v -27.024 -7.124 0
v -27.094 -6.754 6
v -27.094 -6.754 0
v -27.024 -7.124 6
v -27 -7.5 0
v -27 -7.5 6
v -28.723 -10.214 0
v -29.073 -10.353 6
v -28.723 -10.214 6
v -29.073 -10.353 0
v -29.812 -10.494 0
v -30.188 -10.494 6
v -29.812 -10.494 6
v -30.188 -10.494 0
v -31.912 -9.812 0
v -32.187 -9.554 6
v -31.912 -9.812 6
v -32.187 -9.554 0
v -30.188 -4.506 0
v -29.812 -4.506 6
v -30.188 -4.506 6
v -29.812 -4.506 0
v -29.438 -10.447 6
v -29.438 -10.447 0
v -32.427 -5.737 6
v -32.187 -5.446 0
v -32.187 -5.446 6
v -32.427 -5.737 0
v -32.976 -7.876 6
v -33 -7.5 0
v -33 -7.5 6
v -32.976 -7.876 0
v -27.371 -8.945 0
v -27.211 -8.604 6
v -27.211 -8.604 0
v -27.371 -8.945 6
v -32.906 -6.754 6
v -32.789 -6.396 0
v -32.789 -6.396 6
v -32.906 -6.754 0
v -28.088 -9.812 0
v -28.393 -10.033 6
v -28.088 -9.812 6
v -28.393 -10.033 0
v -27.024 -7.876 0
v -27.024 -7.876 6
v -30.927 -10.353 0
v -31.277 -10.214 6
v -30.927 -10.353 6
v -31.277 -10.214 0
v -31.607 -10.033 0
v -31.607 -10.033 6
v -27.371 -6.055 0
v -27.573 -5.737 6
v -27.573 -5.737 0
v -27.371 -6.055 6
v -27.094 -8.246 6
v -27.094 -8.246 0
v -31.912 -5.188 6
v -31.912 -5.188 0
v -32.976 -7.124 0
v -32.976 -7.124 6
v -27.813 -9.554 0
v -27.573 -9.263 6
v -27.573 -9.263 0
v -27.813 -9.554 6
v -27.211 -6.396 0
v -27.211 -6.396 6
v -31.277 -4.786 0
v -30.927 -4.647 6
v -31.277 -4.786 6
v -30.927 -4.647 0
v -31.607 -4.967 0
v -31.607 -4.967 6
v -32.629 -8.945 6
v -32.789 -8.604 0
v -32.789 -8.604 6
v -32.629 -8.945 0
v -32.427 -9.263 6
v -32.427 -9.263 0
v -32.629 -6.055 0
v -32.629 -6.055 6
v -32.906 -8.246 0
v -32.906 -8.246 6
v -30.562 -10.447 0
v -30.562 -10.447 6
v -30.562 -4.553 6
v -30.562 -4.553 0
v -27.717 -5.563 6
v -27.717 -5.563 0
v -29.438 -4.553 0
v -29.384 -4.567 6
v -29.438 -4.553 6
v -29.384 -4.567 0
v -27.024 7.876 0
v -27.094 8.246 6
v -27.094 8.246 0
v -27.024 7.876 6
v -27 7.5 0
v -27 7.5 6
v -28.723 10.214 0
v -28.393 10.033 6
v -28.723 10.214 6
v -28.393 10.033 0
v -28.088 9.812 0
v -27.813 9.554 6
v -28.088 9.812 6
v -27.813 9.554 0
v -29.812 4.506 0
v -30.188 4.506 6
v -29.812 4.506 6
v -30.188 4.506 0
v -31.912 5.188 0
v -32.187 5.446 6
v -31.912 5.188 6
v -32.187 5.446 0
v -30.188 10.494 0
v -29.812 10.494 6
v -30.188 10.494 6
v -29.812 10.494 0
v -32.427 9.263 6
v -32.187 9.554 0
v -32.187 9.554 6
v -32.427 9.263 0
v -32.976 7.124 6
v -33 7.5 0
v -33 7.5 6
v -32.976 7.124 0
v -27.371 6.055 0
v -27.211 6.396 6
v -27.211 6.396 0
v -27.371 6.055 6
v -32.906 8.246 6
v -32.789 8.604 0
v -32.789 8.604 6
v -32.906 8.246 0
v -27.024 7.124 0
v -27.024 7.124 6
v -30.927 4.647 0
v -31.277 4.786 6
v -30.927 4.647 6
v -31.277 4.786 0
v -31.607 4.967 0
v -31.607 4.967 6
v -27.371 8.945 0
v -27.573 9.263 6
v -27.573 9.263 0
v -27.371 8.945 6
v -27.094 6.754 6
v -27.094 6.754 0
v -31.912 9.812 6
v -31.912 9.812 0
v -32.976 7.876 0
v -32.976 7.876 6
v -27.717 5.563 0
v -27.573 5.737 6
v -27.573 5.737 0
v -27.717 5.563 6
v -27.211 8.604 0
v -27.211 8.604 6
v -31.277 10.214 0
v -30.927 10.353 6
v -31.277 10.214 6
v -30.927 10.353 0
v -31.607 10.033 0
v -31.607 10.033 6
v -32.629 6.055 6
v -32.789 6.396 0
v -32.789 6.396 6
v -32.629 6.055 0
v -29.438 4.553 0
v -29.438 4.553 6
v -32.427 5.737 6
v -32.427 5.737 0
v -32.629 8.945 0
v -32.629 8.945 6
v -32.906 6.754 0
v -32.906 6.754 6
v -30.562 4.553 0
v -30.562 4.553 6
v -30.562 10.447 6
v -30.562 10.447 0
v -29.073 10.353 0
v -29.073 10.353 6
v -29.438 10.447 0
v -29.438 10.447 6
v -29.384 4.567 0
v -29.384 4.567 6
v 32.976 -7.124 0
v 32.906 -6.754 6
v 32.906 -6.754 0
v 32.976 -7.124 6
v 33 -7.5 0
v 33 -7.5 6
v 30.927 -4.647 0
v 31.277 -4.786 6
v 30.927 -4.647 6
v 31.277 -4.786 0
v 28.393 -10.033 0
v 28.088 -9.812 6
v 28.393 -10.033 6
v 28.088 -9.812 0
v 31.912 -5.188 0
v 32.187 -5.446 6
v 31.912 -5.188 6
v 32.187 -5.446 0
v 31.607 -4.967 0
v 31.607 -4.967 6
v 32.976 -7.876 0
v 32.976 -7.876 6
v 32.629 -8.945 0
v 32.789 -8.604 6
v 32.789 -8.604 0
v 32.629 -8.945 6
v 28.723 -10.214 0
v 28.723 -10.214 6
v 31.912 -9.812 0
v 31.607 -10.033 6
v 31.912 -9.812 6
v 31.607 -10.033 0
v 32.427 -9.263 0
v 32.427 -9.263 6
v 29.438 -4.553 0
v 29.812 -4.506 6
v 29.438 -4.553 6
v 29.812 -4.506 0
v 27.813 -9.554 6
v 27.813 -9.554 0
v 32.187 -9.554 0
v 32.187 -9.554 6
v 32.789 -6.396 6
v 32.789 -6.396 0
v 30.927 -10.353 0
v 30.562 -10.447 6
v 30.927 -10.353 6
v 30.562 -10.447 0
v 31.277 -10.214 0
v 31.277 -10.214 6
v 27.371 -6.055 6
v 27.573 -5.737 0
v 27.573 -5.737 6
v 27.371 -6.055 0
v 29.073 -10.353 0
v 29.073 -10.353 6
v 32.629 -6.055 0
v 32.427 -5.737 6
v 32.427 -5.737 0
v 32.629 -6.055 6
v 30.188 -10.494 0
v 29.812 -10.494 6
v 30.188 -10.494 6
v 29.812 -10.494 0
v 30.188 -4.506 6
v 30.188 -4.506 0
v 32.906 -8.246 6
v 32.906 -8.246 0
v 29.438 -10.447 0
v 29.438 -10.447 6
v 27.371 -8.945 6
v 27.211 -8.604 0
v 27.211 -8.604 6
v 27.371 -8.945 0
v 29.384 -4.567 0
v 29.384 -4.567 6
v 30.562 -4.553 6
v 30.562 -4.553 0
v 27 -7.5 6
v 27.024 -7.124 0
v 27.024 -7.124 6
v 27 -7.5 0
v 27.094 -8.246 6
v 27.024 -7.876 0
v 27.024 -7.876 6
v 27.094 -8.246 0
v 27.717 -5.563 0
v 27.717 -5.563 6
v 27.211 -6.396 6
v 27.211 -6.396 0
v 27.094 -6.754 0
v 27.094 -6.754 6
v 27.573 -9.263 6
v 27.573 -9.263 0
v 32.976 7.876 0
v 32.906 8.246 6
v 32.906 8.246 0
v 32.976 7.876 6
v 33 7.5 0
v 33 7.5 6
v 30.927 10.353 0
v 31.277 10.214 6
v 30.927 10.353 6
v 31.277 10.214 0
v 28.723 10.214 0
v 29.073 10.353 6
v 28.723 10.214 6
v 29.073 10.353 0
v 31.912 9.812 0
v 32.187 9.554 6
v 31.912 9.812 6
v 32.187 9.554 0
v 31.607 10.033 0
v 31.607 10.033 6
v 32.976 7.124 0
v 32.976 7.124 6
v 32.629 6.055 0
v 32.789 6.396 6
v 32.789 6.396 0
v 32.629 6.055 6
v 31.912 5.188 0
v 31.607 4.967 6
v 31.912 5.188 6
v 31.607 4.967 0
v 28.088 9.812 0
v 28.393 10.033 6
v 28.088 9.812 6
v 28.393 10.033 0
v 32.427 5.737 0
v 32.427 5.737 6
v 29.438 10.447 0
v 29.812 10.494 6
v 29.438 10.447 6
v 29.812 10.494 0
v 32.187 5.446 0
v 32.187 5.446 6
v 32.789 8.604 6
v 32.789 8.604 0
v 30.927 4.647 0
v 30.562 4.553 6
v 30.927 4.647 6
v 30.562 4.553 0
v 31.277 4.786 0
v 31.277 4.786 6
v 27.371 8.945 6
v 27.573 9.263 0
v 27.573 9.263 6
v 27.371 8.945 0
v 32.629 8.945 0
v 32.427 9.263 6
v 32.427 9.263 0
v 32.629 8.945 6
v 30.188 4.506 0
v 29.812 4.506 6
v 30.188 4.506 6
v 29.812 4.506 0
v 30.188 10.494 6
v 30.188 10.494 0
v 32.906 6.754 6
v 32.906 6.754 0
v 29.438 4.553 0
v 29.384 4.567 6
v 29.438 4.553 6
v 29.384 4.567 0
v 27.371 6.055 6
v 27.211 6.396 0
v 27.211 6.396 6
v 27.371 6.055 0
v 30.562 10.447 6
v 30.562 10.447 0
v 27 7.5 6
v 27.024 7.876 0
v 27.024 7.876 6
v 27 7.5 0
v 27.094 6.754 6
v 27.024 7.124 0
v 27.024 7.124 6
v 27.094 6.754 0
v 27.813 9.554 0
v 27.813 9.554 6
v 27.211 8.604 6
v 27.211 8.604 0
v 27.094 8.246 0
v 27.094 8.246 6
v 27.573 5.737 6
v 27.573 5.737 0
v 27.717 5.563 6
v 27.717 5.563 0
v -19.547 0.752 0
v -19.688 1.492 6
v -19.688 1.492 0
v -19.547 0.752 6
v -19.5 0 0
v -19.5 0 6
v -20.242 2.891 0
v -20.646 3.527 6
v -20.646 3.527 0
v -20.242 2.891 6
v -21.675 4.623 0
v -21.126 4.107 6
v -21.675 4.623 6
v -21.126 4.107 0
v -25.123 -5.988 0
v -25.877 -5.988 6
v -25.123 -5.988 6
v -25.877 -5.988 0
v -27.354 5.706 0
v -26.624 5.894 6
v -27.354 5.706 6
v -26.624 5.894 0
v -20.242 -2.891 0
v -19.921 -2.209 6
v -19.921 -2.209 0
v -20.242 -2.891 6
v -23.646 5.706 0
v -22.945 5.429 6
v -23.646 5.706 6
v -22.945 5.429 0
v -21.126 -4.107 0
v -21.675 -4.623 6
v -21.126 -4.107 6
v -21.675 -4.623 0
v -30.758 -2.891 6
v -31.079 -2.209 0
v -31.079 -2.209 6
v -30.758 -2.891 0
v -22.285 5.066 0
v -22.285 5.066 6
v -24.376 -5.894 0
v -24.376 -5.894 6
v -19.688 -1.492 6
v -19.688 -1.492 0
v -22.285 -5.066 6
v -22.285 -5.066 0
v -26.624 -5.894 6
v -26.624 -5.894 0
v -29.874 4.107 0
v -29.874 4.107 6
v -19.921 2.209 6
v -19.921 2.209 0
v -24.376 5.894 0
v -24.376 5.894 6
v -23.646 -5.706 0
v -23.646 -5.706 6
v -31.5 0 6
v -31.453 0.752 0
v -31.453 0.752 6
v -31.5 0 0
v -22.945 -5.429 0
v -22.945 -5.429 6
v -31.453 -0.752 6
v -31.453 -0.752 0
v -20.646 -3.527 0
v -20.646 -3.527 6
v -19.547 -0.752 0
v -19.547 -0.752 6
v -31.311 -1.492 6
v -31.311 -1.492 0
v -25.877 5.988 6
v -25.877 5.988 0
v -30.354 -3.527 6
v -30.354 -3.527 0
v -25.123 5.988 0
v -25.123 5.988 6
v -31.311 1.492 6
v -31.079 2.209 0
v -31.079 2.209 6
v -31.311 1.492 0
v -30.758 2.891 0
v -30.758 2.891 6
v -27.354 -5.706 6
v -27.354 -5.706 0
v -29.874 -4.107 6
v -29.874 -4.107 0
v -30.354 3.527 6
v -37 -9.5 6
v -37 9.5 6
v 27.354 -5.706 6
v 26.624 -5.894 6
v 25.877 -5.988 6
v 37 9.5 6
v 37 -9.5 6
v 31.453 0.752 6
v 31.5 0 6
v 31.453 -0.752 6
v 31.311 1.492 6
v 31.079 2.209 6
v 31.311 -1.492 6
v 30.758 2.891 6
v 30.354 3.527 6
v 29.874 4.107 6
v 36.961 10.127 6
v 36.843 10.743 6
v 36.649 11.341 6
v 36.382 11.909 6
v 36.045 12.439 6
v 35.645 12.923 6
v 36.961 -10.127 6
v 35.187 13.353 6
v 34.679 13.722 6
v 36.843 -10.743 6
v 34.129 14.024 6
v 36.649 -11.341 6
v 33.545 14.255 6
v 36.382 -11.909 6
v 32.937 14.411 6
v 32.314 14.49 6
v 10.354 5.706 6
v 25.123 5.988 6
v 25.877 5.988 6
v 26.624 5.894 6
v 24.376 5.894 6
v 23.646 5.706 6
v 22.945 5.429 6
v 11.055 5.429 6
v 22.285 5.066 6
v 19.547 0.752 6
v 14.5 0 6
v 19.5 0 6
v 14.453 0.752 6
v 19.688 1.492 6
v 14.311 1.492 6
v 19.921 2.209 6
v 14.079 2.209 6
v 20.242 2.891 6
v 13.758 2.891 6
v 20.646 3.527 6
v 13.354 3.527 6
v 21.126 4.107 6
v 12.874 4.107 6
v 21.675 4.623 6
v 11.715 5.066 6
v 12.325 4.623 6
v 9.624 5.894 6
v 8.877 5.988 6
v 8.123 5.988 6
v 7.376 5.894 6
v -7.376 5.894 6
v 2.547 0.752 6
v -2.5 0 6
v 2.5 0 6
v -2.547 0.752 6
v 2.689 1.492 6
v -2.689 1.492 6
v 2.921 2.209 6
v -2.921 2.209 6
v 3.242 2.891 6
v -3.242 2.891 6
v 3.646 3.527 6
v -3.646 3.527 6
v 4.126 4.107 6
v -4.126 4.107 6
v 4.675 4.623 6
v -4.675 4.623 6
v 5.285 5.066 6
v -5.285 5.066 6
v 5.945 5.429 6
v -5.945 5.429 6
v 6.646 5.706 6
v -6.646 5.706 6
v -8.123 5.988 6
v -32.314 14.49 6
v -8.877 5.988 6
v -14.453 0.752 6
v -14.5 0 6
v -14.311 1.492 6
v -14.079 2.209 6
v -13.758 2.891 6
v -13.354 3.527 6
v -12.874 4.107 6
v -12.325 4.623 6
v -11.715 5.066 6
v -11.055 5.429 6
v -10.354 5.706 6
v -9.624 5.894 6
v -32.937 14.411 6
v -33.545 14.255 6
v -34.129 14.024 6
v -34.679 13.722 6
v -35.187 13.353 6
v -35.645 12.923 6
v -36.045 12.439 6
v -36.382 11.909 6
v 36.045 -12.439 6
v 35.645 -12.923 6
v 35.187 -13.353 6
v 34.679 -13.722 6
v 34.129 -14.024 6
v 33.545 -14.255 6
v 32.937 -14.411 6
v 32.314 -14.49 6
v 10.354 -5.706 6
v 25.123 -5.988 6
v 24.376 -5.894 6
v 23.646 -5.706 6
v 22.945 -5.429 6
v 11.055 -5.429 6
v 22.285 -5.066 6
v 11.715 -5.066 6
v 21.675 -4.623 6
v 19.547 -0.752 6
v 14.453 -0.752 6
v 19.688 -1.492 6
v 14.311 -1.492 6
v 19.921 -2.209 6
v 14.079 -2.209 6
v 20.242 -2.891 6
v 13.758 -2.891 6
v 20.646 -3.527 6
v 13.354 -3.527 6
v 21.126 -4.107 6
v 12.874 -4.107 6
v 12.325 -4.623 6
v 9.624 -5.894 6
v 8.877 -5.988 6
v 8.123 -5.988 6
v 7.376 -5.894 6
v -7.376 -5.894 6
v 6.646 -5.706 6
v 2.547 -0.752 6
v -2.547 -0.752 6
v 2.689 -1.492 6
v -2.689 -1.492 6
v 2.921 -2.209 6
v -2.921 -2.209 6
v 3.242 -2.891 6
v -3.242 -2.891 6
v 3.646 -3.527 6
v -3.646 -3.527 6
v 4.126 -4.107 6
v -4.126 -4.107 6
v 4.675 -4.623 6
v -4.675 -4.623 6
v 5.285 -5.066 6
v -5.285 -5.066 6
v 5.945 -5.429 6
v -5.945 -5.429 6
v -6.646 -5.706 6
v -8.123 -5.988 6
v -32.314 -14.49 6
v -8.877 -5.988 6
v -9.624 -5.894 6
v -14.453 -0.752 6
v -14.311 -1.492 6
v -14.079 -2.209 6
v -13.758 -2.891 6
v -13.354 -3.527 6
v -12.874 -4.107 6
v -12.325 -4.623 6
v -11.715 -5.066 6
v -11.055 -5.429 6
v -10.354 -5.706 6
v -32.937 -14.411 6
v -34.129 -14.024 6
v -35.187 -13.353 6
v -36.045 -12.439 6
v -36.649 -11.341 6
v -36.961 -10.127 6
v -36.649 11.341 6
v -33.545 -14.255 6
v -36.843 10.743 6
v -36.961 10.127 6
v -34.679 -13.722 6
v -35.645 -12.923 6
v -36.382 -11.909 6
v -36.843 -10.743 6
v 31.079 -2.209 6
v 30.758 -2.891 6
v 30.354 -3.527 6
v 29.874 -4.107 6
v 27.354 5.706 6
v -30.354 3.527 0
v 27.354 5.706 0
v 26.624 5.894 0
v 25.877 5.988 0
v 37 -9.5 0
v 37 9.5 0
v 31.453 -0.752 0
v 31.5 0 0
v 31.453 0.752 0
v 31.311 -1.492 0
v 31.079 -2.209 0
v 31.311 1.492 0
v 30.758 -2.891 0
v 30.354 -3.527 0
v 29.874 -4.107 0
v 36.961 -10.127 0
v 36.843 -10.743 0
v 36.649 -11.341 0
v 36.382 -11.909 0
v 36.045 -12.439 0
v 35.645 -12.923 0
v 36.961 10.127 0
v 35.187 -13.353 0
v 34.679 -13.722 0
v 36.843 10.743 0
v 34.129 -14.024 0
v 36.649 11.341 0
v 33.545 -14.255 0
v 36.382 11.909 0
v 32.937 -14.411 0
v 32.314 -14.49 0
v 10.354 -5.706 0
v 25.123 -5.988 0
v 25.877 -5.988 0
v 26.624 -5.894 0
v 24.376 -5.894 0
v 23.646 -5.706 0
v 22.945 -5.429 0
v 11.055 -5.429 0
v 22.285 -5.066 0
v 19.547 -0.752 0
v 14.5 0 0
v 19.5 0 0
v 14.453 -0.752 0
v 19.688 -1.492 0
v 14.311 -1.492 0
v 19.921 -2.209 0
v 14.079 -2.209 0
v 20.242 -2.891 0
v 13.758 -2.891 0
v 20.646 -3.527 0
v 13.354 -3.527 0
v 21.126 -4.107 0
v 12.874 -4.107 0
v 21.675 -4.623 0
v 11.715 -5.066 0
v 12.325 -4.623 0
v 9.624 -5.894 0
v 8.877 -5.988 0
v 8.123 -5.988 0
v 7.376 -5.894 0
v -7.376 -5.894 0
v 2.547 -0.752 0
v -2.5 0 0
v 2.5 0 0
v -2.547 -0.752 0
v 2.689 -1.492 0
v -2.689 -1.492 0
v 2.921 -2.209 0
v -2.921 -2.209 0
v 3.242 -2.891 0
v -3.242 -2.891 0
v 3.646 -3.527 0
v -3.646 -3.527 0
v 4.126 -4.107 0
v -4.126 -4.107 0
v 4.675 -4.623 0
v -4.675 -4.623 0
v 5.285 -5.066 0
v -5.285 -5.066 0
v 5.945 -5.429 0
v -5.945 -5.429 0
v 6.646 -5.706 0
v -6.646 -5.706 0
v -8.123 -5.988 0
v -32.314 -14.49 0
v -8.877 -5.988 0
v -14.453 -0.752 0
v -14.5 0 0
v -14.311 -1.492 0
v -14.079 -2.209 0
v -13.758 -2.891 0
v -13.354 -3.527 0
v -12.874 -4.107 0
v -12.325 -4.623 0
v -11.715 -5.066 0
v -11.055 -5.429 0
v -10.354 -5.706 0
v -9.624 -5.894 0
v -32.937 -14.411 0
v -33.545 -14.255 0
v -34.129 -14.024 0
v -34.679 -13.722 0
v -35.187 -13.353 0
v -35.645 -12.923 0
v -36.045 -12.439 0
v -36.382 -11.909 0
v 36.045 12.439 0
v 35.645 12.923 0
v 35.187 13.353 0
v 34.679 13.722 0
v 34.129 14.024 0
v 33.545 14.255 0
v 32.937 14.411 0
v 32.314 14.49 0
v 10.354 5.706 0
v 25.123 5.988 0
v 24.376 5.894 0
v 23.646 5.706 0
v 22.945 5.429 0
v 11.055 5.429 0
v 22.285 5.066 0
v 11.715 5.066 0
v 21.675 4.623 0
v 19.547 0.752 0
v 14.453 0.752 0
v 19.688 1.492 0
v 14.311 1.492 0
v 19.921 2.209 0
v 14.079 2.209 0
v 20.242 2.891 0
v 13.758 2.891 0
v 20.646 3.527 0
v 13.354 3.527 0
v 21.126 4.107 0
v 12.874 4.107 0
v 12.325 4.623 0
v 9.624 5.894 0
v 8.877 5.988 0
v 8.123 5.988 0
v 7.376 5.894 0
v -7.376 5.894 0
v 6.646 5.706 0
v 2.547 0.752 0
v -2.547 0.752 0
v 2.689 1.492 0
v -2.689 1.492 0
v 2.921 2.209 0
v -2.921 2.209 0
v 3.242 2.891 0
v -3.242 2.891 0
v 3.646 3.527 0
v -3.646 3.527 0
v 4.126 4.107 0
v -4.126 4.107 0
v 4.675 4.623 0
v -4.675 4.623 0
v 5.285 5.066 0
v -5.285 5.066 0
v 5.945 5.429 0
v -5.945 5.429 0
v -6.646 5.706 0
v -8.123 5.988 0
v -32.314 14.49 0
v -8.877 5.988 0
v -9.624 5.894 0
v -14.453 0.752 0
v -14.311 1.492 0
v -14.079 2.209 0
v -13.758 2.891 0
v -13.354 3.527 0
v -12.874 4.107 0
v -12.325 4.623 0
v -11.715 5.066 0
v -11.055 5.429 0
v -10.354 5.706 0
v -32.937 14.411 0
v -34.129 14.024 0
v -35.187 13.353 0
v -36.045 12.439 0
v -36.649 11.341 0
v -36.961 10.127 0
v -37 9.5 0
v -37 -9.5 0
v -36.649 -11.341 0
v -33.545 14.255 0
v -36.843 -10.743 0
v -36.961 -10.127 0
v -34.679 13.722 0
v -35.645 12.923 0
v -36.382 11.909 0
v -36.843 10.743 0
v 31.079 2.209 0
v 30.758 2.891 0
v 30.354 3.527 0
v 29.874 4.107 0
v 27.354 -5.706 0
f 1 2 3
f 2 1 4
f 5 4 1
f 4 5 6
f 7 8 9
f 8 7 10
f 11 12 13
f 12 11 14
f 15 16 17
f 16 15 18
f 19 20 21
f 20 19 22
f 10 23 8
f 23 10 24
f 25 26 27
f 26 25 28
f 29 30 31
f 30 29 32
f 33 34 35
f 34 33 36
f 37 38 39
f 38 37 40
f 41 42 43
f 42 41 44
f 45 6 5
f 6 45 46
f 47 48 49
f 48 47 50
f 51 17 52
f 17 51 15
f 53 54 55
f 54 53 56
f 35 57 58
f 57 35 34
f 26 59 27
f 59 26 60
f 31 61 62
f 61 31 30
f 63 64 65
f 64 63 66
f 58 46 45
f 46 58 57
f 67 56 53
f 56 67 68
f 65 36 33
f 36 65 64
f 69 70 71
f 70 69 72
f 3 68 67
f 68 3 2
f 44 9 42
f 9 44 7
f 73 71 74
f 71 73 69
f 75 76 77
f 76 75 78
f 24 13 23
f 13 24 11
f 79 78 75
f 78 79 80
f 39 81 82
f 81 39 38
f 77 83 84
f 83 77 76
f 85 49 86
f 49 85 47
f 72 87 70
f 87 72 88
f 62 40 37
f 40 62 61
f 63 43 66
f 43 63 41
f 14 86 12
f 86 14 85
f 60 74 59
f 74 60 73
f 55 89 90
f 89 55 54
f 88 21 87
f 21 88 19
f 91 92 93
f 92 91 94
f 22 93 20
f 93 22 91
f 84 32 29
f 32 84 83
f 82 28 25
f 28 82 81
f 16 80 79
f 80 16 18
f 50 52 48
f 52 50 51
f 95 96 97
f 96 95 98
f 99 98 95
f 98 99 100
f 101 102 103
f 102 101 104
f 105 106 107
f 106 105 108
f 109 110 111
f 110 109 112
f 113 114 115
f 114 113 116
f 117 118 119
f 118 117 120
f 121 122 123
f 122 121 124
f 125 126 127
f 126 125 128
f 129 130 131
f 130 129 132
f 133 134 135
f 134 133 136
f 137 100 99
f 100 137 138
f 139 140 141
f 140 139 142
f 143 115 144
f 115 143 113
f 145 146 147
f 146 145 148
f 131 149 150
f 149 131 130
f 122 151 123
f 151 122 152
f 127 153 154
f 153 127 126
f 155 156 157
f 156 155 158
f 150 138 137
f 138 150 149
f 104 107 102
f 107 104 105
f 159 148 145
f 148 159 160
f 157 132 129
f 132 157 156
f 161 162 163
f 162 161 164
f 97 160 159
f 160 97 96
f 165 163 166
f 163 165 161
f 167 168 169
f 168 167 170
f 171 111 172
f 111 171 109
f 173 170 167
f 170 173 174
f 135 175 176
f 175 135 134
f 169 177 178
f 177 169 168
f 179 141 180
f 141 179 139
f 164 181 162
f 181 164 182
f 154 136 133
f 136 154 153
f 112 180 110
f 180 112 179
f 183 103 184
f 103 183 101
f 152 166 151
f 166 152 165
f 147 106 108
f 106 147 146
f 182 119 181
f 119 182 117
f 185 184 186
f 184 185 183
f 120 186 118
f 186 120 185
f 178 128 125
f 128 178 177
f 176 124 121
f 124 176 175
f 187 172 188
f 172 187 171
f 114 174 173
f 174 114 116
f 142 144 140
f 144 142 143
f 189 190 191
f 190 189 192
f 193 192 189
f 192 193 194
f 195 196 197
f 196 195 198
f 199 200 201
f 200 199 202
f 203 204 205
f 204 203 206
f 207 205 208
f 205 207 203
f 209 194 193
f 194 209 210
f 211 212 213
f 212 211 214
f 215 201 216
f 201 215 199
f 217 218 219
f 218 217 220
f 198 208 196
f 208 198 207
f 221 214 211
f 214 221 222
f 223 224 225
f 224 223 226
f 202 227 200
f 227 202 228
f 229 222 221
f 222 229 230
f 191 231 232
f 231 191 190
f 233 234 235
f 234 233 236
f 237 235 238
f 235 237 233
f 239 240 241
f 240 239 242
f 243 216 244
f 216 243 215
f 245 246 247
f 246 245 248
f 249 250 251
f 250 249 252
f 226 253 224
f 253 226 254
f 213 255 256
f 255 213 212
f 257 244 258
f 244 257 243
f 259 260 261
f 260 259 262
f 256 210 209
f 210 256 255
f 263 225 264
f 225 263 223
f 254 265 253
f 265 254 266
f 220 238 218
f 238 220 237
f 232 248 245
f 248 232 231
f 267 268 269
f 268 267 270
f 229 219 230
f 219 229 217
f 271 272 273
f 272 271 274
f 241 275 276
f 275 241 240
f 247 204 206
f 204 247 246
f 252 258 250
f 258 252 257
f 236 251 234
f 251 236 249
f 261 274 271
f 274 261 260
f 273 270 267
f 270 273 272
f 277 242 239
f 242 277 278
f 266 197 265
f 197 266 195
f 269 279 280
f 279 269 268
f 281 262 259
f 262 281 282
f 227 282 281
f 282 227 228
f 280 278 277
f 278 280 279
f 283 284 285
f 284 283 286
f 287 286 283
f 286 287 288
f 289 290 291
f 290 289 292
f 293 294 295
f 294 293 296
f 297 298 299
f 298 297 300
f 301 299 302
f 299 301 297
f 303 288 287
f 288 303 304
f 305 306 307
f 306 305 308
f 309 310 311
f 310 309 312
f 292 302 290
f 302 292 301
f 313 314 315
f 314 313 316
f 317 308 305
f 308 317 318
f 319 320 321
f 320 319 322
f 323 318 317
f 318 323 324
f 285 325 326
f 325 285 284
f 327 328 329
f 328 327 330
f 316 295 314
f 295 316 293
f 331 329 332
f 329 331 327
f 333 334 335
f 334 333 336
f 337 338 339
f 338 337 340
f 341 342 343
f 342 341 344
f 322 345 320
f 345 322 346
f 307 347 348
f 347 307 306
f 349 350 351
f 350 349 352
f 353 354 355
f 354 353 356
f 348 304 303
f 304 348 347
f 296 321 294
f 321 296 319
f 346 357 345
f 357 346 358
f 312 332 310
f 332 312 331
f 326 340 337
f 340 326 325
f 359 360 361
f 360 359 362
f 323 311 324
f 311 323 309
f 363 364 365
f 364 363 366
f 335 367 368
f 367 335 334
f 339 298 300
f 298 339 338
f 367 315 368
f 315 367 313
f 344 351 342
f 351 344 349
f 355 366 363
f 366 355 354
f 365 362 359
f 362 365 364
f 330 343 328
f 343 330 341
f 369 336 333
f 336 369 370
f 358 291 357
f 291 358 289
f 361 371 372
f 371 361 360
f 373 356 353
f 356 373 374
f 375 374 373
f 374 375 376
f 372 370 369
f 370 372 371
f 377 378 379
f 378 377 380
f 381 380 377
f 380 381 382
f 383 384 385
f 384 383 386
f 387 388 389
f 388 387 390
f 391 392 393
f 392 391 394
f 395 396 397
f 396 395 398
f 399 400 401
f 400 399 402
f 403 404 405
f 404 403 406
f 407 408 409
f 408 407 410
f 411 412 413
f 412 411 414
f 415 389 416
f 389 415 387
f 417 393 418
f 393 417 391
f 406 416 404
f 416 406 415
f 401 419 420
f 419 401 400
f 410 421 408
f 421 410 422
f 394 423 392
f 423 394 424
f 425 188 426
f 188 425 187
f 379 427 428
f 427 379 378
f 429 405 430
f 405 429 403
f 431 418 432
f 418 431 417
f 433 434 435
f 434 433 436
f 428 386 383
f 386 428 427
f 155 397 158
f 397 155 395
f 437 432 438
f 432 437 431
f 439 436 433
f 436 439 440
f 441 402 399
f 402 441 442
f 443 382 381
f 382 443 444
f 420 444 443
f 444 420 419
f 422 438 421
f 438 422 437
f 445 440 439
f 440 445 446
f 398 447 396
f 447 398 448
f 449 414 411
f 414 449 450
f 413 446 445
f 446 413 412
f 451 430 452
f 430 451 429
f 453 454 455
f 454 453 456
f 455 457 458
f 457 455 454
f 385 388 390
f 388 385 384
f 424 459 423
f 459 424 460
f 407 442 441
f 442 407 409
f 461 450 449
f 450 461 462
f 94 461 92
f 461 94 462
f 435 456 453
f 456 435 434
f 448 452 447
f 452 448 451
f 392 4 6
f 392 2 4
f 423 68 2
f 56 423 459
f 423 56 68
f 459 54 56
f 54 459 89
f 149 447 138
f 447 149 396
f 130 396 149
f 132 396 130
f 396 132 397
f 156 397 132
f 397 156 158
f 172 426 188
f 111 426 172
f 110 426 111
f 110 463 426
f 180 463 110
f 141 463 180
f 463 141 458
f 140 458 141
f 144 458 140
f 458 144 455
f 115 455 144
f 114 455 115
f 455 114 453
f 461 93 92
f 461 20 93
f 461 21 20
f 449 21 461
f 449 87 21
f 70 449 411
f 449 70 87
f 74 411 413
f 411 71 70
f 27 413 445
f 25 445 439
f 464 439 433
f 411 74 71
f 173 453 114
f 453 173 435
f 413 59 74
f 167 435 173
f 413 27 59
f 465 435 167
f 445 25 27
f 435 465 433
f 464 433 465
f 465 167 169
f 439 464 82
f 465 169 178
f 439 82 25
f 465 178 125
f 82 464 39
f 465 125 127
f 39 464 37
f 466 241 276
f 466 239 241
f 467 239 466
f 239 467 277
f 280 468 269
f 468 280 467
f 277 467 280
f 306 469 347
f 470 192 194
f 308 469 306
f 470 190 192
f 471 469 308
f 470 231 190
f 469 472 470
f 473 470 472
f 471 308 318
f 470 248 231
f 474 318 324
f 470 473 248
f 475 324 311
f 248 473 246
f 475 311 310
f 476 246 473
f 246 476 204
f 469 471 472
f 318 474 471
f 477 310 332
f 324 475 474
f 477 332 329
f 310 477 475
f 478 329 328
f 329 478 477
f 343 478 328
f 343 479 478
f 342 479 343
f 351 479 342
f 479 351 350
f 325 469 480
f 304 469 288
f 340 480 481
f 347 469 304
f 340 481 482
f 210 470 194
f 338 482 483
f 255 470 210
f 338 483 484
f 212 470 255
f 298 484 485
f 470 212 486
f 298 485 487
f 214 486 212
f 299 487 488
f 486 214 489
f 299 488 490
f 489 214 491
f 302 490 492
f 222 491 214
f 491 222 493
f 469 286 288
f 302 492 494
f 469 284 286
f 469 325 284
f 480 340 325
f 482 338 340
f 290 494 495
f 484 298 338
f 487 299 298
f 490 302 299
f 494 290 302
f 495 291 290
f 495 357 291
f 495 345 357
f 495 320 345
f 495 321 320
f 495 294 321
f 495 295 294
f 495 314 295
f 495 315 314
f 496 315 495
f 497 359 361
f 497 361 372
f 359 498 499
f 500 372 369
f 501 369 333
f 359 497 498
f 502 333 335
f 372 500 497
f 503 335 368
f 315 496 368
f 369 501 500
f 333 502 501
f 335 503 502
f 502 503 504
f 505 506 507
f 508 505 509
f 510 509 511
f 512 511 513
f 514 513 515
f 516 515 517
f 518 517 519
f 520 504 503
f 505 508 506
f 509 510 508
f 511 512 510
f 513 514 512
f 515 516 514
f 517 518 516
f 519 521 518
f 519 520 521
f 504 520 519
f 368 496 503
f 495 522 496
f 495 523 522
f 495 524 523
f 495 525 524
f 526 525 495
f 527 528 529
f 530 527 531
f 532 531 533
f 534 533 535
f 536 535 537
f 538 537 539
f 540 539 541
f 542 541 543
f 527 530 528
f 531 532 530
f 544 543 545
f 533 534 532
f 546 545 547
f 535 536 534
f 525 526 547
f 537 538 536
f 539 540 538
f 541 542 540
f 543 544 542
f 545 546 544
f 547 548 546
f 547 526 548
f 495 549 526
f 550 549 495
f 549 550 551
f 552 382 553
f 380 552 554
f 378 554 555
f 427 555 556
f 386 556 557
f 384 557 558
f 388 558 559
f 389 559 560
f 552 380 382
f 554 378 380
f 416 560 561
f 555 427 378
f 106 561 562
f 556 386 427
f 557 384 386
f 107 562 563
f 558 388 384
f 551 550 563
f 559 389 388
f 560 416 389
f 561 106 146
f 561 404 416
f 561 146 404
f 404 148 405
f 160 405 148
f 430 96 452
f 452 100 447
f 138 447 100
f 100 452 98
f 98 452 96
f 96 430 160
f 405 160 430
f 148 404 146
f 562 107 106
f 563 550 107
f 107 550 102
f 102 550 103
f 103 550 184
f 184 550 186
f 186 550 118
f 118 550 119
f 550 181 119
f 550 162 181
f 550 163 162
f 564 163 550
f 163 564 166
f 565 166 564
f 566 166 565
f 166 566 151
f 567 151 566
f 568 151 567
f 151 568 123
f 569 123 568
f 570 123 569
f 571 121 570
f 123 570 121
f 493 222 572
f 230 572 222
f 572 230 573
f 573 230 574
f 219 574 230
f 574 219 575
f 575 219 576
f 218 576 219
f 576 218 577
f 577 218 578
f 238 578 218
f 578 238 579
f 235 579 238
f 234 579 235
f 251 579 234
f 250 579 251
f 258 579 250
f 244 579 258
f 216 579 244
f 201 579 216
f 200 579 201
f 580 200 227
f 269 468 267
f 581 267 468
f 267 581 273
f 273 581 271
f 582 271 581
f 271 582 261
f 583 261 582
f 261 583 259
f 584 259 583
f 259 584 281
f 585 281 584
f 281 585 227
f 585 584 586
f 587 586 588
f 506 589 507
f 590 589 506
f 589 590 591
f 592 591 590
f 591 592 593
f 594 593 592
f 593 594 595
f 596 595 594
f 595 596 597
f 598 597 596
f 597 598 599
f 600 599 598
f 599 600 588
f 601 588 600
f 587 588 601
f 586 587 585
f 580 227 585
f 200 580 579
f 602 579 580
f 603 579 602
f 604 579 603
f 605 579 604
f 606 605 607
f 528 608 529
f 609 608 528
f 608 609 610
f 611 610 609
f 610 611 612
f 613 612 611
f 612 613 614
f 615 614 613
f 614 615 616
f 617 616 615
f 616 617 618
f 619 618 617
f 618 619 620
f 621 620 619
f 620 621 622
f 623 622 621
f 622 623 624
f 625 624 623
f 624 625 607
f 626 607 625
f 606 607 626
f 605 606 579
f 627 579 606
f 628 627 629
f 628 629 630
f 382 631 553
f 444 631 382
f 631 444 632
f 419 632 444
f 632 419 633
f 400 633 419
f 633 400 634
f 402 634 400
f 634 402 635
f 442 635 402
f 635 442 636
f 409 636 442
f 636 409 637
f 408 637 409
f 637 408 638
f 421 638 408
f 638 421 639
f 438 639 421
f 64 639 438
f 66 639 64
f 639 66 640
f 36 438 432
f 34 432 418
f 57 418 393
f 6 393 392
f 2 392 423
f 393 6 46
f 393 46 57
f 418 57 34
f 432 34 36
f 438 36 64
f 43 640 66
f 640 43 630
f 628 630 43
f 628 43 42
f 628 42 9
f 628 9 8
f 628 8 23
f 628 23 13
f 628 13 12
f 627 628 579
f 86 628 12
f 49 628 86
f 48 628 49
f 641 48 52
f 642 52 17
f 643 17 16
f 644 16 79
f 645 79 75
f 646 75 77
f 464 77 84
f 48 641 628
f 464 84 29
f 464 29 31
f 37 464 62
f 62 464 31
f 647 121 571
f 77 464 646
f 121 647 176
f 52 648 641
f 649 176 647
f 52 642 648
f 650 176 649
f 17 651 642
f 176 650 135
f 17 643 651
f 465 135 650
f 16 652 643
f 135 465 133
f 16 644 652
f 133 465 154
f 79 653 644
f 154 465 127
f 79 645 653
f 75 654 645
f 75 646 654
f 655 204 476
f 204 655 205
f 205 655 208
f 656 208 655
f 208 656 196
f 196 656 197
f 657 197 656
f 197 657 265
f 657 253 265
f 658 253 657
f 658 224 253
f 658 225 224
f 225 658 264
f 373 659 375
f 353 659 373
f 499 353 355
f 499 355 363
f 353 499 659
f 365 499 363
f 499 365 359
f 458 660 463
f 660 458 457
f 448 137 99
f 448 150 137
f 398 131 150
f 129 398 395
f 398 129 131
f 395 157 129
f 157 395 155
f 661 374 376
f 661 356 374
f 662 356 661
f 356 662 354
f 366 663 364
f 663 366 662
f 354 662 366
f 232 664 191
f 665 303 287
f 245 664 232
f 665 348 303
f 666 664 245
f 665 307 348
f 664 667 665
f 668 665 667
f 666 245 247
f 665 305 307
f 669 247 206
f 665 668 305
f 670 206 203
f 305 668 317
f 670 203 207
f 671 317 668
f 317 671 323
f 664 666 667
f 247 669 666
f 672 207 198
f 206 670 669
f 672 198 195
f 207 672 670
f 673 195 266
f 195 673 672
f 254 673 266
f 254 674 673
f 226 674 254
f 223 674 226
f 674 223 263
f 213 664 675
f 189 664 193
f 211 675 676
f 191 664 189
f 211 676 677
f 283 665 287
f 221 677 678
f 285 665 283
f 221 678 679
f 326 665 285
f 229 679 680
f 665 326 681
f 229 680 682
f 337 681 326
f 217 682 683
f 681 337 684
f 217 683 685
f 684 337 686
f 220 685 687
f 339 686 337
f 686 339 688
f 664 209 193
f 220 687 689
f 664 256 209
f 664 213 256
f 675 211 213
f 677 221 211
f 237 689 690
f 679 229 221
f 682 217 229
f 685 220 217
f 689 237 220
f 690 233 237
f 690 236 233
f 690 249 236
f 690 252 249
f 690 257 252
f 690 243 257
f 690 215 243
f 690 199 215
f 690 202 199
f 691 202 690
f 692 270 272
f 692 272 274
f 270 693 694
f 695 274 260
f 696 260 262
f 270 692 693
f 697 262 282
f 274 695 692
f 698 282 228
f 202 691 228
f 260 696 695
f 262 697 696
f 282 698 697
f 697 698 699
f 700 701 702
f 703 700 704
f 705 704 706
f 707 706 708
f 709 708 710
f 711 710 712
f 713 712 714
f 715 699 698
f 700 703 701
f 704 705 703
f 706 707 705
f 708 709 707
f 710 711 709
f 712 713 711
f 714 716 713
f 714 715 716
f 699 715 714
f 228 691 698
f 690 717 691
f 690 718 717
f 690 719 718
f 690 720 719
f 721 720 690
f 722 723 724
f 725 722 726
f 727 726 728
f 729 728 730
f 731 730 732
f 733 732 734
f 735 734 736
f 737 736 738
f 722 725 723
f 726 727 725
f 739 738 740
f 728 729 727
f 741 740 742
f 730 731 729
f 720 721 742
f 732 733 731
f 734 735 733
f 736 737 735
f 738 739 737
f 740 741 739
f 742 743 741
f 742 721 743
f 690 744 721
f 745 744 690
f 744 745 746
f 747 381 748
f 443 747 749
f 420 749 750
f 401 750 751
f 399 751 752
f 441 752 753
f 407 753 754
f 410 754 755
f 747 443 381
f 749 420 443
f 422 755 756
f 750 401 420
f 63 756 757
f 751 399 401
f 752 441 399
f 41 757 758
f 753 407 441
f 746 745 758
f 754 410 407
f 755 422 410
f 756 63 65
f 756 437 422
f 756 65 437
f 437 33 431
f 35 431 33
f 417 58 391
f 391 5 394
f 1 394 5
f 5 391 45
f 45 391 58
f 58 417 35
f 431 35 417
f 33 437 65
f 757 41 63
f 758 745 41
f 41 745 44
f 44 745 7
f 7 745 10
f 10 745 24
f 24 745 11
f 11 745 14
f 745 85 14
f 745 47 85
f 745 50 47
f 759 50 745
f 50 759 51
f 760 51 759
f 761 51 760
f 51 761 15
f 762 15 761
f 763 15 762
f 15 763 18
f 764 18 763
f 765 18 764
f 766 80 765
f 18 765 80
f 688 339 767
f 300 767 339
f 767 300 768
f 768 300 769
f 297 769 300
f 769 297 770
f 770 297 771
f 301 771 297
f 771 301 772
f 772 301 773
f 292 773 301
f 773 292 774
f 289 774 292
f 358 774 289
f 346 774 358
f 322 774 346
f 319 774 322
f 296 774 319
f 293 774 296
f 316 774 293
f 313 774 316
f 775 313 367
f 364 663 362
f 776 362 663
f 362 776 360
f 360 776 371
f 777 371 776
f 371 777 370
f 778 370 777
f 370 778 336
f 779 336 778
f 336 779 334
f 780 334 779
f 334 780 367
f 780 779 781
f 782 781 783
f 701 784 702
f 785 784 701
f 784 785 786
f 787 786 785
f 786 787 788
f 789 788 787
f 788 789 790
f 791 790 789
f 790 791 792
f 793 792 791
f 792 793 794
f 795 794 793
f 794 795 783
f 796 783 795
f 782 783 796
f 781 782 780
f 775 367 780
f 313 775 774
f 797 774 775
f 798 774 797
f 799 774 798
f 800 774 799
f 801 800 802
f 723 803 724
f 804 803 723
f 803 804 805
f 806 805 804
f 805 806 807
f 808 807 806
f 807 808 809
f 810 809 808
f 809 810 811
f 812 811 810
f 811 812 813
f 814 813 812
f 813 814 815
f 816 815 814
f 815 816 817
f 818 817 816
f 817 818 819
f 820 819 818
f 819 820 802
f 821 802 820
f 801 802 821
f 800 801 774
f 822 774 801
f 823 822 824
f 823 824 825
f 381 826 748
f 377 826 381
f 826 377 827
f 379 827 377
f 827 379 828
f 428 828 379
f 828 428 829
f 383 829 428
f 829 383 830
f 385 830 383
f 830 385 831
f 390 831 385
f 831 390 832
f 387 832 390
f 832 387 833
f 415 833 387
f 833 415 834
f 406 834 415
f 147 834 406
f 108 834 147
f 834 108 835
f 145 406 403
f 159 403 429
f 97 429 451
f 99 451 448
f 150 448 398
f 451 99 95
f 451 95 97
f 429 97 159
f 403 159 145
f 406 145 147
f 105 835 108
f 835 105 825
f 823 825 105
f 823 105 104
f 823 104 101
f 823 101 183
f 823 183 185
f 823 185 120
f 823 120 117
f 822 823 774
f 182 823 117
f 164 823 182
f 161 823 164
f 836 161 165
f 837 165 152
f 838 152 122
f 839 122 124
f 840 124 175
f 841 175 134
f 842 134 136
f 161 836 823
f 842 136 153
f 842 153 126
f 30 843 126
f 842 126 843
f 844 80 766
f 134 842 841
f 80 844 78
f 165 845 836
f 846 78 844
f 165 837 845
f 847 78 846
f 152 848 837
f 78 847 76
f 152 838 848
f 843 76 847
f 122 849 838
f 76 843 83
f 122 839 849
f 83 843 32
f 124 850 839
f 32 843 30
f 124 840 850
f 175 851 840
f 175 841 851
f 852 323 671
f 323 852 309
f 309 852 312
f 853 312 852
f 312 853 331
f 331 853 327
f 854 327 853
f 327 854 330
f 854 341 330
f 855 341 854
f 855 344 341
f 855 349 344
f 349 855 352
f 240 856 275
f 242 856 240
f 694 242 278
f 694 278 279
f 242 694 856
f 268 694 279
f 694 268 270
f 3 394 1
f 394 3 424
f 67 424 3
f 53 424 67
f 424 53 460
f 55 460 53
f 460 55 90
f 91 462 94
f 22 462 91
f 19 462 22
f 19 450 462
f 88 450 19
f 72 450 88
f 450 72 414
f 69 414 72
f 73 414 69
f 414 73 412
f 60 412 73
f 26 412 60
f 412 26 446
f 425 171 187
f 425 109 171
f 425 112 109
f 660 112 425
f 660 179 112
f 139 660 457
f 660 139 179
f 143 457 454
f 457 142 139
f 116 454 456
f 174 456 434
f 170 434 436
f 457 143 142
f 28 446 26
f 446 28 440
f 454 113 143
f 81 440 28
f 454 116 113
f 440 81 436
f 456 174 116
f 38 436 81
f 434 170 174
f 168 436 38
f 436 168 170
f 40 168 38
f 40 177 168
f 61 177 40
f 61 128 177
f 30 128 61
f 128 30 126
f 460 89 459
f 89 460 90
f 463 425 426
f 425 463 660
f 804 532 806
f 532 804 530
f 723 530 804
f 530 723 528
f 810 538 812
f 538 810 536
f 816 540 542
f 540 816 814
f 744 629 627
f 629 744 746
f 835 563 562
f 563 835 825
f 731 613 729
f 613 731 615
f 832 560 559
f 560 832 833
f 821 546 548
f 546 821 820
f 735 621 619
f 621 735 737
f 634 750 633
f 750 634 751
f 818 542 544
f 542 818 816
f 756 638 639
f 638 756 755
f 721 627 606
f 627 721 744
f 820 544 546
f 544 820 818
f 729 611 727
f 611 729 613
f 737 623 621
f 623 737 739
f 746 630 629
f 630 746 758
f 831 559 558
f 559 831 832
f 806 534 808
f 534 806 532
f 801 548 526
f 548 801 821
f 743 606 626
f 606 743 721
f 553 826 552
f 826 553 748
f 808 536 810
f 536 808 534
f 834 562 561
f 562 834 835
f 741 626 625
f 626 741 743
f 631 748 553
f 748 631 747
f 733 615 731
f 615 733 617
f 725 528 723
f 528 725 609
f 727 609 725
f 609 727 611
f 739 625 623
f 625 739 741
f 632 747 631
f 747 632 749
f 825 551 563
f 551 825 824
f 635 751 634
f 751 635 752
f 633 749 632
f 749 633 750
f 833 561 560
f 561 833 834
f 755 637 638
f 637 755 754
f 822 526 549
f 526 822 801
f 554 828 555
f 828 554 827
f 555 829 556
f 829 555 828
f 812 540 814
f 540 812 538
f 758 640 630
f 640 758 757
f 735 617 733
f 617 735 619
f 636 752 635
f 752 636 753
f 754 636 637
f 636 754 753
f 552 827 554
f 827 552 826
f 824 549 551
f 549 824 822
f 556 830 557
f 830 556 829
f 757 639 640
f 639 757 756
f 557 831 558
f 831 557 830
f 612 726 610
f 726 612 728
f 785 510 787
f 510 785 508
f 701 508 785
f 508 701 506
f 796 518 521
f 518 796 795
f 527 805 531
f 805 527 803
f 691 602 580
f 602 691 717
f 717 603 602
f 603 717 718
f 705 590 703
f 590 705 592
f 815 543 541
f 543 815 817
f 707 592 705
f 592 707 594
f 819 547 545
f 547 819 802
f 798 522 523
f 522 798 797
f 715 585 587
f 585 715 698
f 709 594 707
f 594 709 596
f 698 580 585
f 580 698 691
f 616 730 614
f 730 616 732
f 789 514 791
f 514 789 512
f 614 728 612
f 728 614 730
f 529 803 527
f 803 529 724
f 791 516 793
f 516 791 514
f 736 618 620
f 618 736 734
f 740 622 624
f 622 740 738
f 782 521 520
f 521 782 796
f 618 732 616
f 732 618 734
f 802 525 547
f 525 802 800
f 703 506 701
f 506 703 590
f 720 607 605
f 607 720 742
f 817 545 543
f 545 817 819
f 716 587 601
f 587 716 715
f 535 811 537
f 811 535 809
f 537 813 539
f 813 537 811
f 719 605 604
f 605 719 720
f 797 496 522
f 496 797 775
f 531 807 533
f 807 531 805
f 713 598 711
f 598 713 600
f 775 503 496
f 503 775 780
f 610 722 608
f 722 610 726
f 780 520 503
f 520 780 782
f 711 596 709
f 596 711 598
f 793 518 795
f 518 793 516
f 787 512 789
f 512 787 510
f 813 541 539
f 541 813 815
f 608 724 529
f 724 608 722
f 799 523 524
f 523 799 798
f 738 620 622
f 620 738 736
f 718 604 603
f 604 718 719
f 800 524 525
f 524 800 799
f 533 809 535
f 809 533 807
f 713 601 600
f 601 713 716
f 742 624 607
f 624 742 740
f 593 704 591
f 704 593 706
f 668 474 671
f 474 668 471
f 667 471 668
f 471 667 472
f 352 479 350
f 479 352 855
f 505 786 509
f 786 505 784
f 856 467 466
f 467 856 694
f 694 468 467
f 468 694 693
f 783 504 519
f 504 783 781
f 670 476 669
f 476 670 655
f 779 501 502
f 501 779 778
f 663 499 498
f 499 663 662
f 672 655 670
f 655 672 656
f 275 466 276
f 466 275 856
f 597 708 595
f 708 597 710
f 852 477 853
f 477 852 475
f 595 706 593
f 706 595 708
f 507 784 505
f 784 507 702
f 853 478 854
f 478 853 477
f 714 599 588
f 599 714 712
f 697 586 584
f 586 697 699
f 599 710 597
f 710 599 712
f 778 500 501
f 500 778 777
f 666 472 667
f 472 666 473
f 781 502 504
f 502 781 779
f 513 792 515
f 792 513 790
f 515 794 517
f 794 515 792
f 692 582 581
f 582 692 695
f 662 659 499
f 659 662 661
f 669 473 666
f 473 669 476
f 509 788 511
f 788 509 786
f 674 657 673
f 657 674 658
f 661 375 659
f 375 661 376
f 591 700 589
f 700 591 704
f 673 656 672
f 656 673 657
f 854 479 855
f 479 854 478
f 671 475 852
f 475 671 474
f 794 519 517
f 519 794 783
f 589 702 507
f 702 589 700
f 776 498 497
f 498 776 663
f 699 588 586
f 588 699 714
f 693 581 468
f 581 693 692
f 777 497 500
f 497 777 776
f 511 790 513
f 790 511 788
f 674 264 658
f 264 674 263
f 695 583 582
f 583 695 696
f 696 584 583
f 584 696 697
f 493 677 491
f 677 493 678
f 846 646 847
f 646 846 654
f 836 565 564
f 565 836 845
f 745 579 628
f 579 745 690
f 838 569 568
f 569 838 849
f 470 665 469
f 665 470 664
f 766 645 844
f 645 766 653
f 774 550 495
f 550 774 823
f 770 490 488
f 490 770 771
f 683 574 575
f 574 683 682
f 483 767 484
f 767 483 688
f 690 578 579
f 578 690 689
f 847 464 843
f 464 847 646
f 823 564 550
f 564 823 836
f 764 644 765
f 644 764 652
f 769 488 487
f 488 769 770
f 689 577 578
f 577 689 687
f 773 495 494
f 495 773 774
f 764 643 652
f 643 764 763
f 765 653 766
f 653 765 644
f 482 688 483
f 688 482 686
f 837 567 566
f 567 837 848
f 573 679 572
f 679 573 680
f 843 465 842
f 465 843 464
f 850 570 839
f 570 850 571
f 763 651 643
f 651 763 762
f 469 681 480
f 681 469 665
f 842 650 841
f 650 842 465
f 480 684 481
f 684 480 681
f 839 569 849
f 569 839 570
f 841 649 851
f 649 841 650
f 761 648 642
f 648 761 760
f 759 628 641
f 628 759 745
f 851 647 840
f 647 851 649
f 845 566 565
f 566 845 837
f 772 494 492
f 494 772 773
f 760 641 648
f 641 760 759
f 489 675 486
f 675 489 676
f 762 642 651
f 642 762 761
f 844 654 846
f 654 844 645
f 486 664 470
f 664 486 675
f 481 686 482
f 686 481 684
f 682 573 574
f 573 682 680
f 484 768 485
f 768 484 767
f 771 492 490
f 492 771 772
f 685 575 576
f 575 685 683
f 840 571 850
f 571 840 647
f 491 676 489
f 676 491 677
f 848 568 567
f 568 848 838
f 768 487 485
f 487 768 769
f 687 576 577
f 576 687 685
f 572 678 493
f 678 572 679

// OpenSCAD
$fn = 50;


difference() {
	union() {
		hull() {
			translate(v = [-32.0000000000, 9.5000000000, 0]) {
				cylinder(h = 6, r = 5);
			}
			translate(v = [32.0000000000, 9.5000000000, 0]) {
				cylinder(h = 6, r = 5);
			}
			translate(v = [-32.0000000000, -9.5000000000, 0]) {
				cylinder(h = 6, r = 5);
			}
			translate(v = [32.0000000000, -9.5000000000, 0]) {
				cylinder(h = 6, r = 5);
			}
		}
	}
	union() {
		#translate(v = [-30.0000000000, -7.5000000000, -100.0000000000]) {
			cylinder(h = 200, r = 3.0000000000);
		}
		#translate(v = [-30.0000000000, 7.5000000000, -100.0000000000]) {
			cylinder(h = 200, r = 3.0000000000);
		}
		#translate(v = [30.0000000000, -7.5000000000, -100.0000000000]) {
			cylinder(h = 200, r = 3.0000000000);
		}
		#translate(v = [30.0000000000, 7.5000000000, -100.0000000000]) {
			cylinder(h = 200, r = 3.0000000000);
		}
		#translate(v = [-25.5000000000, 0, 0]) {
			cylinder(h = 6, r = 6.0000000000);
		}
		#translate(v = [-8.5000000000, 0, 0]) {
			cylinder(h = 6, r = 6.0000000000);
		}
		#translate(v = [8.5000000000, 0, 0]) {
			cylinder(h = 6, r = 6.0000000000);
		}
		#translate(v = [25.5000000000, 0, 0]) {
			cylinder(h = 6, r = 6.0000000000);
		}
	}
}
